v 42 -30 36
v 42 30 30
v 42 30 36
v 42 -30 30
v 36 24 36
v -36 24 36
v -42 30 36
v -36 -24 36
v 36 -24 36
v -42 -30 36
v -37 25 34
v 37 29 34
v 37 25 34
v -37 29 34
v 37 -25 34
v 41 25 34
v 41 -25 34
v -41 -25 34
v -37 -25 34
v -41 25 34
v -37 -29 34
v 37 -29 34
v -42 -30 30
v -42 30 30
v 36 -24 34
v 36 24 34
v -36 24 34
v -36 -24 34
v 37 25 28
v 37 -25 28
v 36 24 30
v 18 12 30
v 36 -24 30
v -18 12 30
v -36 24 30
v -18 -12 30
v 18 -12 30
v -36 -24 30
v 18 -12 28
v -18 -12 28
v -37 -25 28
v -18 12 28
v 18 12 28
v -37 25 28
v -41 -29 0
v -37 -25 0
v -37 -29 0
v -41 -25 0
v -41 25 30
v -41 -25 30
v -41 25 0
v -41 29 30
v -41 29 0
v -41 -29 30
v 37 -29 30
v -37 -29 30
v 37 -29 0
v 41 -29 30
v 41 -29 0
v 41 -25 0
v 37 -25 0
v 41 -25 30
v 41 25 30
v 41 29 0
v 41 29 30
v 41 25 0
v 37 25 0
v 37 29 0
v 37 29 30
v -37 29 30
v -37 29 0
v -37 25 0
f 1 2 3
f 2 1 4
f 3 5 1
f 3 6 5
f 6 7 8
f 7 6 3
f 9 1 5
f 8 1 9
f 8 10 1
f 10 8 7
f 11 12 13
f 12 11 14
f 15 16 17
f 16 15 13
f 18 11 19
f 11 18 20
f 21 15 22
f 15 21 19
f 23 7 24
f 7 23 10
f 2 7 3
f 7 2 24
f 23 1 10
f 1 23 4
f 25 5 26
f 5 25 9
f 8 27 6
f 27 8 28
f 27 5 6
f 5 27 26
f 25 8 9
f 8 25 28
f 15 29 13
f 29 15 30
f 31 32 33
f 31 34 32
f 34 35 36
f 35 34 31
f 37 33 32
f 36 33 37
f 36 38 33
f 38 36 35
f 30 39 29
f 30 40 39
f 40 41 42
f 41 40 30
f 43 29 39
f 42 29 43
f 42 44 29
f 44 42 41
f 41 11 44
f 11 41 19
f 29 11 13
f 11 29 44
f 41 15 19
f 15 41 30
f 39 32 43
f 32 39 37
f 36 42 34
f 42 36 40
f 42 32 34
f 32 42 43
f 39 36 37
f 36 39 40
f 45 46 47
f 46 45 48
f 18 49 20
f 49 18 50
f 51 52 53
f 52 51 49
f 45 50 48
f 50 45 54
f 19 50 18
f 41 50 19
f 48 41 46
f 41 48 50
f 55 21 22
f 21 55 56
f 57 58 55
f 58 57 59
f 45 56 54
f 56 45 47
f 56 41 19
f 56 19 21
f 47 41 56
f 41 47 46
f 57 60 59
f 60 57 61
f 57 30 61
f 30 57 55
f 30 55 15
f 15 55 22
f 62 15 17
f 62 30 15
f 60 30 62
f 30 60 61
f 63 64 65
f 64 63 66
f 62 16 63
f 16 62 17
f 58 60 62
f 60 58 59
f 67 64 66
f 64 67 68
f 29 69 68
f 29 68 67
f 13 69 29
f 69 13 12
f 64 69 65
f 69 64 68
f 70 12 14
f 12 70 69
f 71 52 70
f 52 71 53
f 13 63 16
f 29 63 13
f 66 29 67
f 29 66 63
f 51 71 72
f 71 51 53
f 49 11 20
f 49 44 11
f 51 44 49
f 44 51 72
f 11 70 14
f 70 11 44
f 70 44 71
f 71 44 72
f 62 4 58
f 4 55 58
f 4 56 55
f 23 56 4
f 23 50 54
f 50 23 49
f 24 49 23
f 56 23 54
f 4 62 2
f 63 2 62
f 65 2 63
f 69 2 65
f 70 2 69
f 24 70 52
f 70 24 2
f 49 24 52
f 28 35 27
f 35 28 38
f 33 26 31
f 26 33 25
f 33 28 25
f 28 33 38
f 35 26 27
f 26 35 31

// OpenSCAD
// variables
table_leg_x = 2; // table's x leg dimension. The x value should be 1/2. It is expected that 2 boards will be glued together.
table_leg_y = 4; // table's y leg dimension.
table_leg_z = 28; // table's z leg dimension.

inner_x = 72; // the inner x dimention of the game table. Primarily used for drop game space on the table.
inner_y = 48; // the inner y dimention of the game table. Primarily used for drop game space on the table.

outter_x_diff = 6; // the difference between the outter and the inner x values on any 1 side of the table.
outter_y_diff = 6; // the difference between the outter and the inner y values on any 1 side of the table.

outter_x = inner_x + outter_x_diff * 2; // the outter x dimensions of the table.
outter_y = inner_y + outter_y_diff * 2; // the outter y dimensions of the table.

topper_z = 2; // z value of the topper boards (the thing that acts like arm rests that cup holders will go in, ect).
depth_from_topper = 6 ; // the depth that the gamespace should be from the topper (the highest/topmost point of the table).

support_x = 1; // the width of the support boards on the x axis.
support_y = 1; // the width of the support boards on the y axis.

tv_cutout_x = 36; // the x dimention of the tv cutout.
tv_cutout_y = 24;// the y dimention of the tv cutout.

// gamespace_x = inner_x; // x value of the recessed game space.
// gamespace_y = inner_y; // y value of the recessed game space.

module table_leg(x = table_leg_x, y = table_leg_y, z = table_leg_z) {
  translate([0-x/2, 0, 0]) {
    color("red")
    cube([x, y, z + depth_from_topper], center=true);
  }
  translate([0+x/2, 0, 0]) {
    color("blue")
    cube([x, y, z + depth_from_topper], center=true);
  }
}

// table topper
translate([0, 0, table_leg_z + depth_from_topper + topper_z/2]) {
  color("purple")
  difference() {
    cube([outter_x, outter_y, topper_z], center = true);
    cube([inner_x, inner_y, topper_z + .5], center = true);
  }
};

// support frame for the topper

  // outter supports
  translate([0 - outter_x/2 + support_x/2, 0, table_leg_z + depth_from_topper/2 + topper_z/2]) {
    color("green")
    cube([support_x, outter_y, depth_from_topper - topper_z], center = true);
  };
  translate([0 + outter_x/2 - support_x/2, 0, table_leg_z + depth_from_topper/2 + topper_z/2]) {
    color("green")
    cube([support_x, outter_y, depth_from_topper - topper_z], center = true);
  };
  translate([0, 0 - outter_y/2 + support_y/2, table_leg_z + depth_from_topper/2 + topper_z/2]) {
    color("green")
    cube([outter_x, support_y, depth_from_topper - topper_z], center = true);
  };
  translate([0, 0 + outter_y/2 - support_y/2, table_leg_z + depth_from_topper/2 + topper_z/2]) {
    color("green")
    cube([outter_x, support_y, depth_from_topper - topper_z], center = true);
  };

  // inner supports
  translate([0 - inner_x/2 - support_x/2, 0, table_leg_z + depth_from_topper/2 + topper_z/2]) {
    color("yellow")
    cube([support_x, inner_y + support_y * 2, depth_from_topper - topper_z], center = true);
  };
  translate([0 + inner_x/2 + support_x/2, 0, table_leg_z + depth_from_topper/2 + topper_z/2]) {
    color("yellow")
    cube([support_x, inner_y + support_y * 2, depth_from_topper - topper_z], center = true);
  };
  translate([0, 0 - inner_y/2 - support_y/2, table_leg_z + depth_from_topper/2 + topper_z/2]) {
    color("yellow")
    cube([inner_x + support_x * 2, support_y, depth_from_topper - topper_z], center = true);
  };
  translate([0, 0 + inner_y/2 + support_y/2, table_leg_z + depth_from_topper/2 + topper_z/2]) {
    color("yellow")
    cube([inner_x + support_x * 2, support_y, depth_from_topper - topper_z], center = true);
  };

// drop game space
translate([0, 0, table_leg_z + topper_z/2]) {
  color("orange")
  difference() {
    cube([inner_x + support_x * 2, inner_y + support_y * 2, topper_z], center = true);
    cube([tv_cutout_x, tv_cutout_y, topper_z + .5], center = true);
  }
};


// add table legs
translate([
  0 - outter_x/2 + table_leg_x + support_x, 
  0 - outter_y/2 + table_leg_y/2 + support_y, 
  0 + table_leg_z/2 + depth_from_topper/2
]) {
  table_leg();
}

translate([
  0 + outter_x/2 - table_leg_x - support_x, 
  0 - outter_y/2 + table_leg_y/2 + support_y, 
  0 + table_leg_z/2 + depth_from_topper/2
]) {
  table_leg();
}

translate([
  0 + outter_x/2 - table_leg_x - support_x, 
  0 + outter_y/2 - table_leg_y/2 - support_y, 
  0 + table_leg_z/2 + depth_from_topper/2
]) {
  table_leg();
}

translate([
  0 - outter_x/2 + table_leg_x + support_x, 
  0 + outter_y/2 - table_leg_y/2 - support_y, 
  0 + table_leg_z/2 + depth_from_topper/2
]) {
  table_leg();
}
